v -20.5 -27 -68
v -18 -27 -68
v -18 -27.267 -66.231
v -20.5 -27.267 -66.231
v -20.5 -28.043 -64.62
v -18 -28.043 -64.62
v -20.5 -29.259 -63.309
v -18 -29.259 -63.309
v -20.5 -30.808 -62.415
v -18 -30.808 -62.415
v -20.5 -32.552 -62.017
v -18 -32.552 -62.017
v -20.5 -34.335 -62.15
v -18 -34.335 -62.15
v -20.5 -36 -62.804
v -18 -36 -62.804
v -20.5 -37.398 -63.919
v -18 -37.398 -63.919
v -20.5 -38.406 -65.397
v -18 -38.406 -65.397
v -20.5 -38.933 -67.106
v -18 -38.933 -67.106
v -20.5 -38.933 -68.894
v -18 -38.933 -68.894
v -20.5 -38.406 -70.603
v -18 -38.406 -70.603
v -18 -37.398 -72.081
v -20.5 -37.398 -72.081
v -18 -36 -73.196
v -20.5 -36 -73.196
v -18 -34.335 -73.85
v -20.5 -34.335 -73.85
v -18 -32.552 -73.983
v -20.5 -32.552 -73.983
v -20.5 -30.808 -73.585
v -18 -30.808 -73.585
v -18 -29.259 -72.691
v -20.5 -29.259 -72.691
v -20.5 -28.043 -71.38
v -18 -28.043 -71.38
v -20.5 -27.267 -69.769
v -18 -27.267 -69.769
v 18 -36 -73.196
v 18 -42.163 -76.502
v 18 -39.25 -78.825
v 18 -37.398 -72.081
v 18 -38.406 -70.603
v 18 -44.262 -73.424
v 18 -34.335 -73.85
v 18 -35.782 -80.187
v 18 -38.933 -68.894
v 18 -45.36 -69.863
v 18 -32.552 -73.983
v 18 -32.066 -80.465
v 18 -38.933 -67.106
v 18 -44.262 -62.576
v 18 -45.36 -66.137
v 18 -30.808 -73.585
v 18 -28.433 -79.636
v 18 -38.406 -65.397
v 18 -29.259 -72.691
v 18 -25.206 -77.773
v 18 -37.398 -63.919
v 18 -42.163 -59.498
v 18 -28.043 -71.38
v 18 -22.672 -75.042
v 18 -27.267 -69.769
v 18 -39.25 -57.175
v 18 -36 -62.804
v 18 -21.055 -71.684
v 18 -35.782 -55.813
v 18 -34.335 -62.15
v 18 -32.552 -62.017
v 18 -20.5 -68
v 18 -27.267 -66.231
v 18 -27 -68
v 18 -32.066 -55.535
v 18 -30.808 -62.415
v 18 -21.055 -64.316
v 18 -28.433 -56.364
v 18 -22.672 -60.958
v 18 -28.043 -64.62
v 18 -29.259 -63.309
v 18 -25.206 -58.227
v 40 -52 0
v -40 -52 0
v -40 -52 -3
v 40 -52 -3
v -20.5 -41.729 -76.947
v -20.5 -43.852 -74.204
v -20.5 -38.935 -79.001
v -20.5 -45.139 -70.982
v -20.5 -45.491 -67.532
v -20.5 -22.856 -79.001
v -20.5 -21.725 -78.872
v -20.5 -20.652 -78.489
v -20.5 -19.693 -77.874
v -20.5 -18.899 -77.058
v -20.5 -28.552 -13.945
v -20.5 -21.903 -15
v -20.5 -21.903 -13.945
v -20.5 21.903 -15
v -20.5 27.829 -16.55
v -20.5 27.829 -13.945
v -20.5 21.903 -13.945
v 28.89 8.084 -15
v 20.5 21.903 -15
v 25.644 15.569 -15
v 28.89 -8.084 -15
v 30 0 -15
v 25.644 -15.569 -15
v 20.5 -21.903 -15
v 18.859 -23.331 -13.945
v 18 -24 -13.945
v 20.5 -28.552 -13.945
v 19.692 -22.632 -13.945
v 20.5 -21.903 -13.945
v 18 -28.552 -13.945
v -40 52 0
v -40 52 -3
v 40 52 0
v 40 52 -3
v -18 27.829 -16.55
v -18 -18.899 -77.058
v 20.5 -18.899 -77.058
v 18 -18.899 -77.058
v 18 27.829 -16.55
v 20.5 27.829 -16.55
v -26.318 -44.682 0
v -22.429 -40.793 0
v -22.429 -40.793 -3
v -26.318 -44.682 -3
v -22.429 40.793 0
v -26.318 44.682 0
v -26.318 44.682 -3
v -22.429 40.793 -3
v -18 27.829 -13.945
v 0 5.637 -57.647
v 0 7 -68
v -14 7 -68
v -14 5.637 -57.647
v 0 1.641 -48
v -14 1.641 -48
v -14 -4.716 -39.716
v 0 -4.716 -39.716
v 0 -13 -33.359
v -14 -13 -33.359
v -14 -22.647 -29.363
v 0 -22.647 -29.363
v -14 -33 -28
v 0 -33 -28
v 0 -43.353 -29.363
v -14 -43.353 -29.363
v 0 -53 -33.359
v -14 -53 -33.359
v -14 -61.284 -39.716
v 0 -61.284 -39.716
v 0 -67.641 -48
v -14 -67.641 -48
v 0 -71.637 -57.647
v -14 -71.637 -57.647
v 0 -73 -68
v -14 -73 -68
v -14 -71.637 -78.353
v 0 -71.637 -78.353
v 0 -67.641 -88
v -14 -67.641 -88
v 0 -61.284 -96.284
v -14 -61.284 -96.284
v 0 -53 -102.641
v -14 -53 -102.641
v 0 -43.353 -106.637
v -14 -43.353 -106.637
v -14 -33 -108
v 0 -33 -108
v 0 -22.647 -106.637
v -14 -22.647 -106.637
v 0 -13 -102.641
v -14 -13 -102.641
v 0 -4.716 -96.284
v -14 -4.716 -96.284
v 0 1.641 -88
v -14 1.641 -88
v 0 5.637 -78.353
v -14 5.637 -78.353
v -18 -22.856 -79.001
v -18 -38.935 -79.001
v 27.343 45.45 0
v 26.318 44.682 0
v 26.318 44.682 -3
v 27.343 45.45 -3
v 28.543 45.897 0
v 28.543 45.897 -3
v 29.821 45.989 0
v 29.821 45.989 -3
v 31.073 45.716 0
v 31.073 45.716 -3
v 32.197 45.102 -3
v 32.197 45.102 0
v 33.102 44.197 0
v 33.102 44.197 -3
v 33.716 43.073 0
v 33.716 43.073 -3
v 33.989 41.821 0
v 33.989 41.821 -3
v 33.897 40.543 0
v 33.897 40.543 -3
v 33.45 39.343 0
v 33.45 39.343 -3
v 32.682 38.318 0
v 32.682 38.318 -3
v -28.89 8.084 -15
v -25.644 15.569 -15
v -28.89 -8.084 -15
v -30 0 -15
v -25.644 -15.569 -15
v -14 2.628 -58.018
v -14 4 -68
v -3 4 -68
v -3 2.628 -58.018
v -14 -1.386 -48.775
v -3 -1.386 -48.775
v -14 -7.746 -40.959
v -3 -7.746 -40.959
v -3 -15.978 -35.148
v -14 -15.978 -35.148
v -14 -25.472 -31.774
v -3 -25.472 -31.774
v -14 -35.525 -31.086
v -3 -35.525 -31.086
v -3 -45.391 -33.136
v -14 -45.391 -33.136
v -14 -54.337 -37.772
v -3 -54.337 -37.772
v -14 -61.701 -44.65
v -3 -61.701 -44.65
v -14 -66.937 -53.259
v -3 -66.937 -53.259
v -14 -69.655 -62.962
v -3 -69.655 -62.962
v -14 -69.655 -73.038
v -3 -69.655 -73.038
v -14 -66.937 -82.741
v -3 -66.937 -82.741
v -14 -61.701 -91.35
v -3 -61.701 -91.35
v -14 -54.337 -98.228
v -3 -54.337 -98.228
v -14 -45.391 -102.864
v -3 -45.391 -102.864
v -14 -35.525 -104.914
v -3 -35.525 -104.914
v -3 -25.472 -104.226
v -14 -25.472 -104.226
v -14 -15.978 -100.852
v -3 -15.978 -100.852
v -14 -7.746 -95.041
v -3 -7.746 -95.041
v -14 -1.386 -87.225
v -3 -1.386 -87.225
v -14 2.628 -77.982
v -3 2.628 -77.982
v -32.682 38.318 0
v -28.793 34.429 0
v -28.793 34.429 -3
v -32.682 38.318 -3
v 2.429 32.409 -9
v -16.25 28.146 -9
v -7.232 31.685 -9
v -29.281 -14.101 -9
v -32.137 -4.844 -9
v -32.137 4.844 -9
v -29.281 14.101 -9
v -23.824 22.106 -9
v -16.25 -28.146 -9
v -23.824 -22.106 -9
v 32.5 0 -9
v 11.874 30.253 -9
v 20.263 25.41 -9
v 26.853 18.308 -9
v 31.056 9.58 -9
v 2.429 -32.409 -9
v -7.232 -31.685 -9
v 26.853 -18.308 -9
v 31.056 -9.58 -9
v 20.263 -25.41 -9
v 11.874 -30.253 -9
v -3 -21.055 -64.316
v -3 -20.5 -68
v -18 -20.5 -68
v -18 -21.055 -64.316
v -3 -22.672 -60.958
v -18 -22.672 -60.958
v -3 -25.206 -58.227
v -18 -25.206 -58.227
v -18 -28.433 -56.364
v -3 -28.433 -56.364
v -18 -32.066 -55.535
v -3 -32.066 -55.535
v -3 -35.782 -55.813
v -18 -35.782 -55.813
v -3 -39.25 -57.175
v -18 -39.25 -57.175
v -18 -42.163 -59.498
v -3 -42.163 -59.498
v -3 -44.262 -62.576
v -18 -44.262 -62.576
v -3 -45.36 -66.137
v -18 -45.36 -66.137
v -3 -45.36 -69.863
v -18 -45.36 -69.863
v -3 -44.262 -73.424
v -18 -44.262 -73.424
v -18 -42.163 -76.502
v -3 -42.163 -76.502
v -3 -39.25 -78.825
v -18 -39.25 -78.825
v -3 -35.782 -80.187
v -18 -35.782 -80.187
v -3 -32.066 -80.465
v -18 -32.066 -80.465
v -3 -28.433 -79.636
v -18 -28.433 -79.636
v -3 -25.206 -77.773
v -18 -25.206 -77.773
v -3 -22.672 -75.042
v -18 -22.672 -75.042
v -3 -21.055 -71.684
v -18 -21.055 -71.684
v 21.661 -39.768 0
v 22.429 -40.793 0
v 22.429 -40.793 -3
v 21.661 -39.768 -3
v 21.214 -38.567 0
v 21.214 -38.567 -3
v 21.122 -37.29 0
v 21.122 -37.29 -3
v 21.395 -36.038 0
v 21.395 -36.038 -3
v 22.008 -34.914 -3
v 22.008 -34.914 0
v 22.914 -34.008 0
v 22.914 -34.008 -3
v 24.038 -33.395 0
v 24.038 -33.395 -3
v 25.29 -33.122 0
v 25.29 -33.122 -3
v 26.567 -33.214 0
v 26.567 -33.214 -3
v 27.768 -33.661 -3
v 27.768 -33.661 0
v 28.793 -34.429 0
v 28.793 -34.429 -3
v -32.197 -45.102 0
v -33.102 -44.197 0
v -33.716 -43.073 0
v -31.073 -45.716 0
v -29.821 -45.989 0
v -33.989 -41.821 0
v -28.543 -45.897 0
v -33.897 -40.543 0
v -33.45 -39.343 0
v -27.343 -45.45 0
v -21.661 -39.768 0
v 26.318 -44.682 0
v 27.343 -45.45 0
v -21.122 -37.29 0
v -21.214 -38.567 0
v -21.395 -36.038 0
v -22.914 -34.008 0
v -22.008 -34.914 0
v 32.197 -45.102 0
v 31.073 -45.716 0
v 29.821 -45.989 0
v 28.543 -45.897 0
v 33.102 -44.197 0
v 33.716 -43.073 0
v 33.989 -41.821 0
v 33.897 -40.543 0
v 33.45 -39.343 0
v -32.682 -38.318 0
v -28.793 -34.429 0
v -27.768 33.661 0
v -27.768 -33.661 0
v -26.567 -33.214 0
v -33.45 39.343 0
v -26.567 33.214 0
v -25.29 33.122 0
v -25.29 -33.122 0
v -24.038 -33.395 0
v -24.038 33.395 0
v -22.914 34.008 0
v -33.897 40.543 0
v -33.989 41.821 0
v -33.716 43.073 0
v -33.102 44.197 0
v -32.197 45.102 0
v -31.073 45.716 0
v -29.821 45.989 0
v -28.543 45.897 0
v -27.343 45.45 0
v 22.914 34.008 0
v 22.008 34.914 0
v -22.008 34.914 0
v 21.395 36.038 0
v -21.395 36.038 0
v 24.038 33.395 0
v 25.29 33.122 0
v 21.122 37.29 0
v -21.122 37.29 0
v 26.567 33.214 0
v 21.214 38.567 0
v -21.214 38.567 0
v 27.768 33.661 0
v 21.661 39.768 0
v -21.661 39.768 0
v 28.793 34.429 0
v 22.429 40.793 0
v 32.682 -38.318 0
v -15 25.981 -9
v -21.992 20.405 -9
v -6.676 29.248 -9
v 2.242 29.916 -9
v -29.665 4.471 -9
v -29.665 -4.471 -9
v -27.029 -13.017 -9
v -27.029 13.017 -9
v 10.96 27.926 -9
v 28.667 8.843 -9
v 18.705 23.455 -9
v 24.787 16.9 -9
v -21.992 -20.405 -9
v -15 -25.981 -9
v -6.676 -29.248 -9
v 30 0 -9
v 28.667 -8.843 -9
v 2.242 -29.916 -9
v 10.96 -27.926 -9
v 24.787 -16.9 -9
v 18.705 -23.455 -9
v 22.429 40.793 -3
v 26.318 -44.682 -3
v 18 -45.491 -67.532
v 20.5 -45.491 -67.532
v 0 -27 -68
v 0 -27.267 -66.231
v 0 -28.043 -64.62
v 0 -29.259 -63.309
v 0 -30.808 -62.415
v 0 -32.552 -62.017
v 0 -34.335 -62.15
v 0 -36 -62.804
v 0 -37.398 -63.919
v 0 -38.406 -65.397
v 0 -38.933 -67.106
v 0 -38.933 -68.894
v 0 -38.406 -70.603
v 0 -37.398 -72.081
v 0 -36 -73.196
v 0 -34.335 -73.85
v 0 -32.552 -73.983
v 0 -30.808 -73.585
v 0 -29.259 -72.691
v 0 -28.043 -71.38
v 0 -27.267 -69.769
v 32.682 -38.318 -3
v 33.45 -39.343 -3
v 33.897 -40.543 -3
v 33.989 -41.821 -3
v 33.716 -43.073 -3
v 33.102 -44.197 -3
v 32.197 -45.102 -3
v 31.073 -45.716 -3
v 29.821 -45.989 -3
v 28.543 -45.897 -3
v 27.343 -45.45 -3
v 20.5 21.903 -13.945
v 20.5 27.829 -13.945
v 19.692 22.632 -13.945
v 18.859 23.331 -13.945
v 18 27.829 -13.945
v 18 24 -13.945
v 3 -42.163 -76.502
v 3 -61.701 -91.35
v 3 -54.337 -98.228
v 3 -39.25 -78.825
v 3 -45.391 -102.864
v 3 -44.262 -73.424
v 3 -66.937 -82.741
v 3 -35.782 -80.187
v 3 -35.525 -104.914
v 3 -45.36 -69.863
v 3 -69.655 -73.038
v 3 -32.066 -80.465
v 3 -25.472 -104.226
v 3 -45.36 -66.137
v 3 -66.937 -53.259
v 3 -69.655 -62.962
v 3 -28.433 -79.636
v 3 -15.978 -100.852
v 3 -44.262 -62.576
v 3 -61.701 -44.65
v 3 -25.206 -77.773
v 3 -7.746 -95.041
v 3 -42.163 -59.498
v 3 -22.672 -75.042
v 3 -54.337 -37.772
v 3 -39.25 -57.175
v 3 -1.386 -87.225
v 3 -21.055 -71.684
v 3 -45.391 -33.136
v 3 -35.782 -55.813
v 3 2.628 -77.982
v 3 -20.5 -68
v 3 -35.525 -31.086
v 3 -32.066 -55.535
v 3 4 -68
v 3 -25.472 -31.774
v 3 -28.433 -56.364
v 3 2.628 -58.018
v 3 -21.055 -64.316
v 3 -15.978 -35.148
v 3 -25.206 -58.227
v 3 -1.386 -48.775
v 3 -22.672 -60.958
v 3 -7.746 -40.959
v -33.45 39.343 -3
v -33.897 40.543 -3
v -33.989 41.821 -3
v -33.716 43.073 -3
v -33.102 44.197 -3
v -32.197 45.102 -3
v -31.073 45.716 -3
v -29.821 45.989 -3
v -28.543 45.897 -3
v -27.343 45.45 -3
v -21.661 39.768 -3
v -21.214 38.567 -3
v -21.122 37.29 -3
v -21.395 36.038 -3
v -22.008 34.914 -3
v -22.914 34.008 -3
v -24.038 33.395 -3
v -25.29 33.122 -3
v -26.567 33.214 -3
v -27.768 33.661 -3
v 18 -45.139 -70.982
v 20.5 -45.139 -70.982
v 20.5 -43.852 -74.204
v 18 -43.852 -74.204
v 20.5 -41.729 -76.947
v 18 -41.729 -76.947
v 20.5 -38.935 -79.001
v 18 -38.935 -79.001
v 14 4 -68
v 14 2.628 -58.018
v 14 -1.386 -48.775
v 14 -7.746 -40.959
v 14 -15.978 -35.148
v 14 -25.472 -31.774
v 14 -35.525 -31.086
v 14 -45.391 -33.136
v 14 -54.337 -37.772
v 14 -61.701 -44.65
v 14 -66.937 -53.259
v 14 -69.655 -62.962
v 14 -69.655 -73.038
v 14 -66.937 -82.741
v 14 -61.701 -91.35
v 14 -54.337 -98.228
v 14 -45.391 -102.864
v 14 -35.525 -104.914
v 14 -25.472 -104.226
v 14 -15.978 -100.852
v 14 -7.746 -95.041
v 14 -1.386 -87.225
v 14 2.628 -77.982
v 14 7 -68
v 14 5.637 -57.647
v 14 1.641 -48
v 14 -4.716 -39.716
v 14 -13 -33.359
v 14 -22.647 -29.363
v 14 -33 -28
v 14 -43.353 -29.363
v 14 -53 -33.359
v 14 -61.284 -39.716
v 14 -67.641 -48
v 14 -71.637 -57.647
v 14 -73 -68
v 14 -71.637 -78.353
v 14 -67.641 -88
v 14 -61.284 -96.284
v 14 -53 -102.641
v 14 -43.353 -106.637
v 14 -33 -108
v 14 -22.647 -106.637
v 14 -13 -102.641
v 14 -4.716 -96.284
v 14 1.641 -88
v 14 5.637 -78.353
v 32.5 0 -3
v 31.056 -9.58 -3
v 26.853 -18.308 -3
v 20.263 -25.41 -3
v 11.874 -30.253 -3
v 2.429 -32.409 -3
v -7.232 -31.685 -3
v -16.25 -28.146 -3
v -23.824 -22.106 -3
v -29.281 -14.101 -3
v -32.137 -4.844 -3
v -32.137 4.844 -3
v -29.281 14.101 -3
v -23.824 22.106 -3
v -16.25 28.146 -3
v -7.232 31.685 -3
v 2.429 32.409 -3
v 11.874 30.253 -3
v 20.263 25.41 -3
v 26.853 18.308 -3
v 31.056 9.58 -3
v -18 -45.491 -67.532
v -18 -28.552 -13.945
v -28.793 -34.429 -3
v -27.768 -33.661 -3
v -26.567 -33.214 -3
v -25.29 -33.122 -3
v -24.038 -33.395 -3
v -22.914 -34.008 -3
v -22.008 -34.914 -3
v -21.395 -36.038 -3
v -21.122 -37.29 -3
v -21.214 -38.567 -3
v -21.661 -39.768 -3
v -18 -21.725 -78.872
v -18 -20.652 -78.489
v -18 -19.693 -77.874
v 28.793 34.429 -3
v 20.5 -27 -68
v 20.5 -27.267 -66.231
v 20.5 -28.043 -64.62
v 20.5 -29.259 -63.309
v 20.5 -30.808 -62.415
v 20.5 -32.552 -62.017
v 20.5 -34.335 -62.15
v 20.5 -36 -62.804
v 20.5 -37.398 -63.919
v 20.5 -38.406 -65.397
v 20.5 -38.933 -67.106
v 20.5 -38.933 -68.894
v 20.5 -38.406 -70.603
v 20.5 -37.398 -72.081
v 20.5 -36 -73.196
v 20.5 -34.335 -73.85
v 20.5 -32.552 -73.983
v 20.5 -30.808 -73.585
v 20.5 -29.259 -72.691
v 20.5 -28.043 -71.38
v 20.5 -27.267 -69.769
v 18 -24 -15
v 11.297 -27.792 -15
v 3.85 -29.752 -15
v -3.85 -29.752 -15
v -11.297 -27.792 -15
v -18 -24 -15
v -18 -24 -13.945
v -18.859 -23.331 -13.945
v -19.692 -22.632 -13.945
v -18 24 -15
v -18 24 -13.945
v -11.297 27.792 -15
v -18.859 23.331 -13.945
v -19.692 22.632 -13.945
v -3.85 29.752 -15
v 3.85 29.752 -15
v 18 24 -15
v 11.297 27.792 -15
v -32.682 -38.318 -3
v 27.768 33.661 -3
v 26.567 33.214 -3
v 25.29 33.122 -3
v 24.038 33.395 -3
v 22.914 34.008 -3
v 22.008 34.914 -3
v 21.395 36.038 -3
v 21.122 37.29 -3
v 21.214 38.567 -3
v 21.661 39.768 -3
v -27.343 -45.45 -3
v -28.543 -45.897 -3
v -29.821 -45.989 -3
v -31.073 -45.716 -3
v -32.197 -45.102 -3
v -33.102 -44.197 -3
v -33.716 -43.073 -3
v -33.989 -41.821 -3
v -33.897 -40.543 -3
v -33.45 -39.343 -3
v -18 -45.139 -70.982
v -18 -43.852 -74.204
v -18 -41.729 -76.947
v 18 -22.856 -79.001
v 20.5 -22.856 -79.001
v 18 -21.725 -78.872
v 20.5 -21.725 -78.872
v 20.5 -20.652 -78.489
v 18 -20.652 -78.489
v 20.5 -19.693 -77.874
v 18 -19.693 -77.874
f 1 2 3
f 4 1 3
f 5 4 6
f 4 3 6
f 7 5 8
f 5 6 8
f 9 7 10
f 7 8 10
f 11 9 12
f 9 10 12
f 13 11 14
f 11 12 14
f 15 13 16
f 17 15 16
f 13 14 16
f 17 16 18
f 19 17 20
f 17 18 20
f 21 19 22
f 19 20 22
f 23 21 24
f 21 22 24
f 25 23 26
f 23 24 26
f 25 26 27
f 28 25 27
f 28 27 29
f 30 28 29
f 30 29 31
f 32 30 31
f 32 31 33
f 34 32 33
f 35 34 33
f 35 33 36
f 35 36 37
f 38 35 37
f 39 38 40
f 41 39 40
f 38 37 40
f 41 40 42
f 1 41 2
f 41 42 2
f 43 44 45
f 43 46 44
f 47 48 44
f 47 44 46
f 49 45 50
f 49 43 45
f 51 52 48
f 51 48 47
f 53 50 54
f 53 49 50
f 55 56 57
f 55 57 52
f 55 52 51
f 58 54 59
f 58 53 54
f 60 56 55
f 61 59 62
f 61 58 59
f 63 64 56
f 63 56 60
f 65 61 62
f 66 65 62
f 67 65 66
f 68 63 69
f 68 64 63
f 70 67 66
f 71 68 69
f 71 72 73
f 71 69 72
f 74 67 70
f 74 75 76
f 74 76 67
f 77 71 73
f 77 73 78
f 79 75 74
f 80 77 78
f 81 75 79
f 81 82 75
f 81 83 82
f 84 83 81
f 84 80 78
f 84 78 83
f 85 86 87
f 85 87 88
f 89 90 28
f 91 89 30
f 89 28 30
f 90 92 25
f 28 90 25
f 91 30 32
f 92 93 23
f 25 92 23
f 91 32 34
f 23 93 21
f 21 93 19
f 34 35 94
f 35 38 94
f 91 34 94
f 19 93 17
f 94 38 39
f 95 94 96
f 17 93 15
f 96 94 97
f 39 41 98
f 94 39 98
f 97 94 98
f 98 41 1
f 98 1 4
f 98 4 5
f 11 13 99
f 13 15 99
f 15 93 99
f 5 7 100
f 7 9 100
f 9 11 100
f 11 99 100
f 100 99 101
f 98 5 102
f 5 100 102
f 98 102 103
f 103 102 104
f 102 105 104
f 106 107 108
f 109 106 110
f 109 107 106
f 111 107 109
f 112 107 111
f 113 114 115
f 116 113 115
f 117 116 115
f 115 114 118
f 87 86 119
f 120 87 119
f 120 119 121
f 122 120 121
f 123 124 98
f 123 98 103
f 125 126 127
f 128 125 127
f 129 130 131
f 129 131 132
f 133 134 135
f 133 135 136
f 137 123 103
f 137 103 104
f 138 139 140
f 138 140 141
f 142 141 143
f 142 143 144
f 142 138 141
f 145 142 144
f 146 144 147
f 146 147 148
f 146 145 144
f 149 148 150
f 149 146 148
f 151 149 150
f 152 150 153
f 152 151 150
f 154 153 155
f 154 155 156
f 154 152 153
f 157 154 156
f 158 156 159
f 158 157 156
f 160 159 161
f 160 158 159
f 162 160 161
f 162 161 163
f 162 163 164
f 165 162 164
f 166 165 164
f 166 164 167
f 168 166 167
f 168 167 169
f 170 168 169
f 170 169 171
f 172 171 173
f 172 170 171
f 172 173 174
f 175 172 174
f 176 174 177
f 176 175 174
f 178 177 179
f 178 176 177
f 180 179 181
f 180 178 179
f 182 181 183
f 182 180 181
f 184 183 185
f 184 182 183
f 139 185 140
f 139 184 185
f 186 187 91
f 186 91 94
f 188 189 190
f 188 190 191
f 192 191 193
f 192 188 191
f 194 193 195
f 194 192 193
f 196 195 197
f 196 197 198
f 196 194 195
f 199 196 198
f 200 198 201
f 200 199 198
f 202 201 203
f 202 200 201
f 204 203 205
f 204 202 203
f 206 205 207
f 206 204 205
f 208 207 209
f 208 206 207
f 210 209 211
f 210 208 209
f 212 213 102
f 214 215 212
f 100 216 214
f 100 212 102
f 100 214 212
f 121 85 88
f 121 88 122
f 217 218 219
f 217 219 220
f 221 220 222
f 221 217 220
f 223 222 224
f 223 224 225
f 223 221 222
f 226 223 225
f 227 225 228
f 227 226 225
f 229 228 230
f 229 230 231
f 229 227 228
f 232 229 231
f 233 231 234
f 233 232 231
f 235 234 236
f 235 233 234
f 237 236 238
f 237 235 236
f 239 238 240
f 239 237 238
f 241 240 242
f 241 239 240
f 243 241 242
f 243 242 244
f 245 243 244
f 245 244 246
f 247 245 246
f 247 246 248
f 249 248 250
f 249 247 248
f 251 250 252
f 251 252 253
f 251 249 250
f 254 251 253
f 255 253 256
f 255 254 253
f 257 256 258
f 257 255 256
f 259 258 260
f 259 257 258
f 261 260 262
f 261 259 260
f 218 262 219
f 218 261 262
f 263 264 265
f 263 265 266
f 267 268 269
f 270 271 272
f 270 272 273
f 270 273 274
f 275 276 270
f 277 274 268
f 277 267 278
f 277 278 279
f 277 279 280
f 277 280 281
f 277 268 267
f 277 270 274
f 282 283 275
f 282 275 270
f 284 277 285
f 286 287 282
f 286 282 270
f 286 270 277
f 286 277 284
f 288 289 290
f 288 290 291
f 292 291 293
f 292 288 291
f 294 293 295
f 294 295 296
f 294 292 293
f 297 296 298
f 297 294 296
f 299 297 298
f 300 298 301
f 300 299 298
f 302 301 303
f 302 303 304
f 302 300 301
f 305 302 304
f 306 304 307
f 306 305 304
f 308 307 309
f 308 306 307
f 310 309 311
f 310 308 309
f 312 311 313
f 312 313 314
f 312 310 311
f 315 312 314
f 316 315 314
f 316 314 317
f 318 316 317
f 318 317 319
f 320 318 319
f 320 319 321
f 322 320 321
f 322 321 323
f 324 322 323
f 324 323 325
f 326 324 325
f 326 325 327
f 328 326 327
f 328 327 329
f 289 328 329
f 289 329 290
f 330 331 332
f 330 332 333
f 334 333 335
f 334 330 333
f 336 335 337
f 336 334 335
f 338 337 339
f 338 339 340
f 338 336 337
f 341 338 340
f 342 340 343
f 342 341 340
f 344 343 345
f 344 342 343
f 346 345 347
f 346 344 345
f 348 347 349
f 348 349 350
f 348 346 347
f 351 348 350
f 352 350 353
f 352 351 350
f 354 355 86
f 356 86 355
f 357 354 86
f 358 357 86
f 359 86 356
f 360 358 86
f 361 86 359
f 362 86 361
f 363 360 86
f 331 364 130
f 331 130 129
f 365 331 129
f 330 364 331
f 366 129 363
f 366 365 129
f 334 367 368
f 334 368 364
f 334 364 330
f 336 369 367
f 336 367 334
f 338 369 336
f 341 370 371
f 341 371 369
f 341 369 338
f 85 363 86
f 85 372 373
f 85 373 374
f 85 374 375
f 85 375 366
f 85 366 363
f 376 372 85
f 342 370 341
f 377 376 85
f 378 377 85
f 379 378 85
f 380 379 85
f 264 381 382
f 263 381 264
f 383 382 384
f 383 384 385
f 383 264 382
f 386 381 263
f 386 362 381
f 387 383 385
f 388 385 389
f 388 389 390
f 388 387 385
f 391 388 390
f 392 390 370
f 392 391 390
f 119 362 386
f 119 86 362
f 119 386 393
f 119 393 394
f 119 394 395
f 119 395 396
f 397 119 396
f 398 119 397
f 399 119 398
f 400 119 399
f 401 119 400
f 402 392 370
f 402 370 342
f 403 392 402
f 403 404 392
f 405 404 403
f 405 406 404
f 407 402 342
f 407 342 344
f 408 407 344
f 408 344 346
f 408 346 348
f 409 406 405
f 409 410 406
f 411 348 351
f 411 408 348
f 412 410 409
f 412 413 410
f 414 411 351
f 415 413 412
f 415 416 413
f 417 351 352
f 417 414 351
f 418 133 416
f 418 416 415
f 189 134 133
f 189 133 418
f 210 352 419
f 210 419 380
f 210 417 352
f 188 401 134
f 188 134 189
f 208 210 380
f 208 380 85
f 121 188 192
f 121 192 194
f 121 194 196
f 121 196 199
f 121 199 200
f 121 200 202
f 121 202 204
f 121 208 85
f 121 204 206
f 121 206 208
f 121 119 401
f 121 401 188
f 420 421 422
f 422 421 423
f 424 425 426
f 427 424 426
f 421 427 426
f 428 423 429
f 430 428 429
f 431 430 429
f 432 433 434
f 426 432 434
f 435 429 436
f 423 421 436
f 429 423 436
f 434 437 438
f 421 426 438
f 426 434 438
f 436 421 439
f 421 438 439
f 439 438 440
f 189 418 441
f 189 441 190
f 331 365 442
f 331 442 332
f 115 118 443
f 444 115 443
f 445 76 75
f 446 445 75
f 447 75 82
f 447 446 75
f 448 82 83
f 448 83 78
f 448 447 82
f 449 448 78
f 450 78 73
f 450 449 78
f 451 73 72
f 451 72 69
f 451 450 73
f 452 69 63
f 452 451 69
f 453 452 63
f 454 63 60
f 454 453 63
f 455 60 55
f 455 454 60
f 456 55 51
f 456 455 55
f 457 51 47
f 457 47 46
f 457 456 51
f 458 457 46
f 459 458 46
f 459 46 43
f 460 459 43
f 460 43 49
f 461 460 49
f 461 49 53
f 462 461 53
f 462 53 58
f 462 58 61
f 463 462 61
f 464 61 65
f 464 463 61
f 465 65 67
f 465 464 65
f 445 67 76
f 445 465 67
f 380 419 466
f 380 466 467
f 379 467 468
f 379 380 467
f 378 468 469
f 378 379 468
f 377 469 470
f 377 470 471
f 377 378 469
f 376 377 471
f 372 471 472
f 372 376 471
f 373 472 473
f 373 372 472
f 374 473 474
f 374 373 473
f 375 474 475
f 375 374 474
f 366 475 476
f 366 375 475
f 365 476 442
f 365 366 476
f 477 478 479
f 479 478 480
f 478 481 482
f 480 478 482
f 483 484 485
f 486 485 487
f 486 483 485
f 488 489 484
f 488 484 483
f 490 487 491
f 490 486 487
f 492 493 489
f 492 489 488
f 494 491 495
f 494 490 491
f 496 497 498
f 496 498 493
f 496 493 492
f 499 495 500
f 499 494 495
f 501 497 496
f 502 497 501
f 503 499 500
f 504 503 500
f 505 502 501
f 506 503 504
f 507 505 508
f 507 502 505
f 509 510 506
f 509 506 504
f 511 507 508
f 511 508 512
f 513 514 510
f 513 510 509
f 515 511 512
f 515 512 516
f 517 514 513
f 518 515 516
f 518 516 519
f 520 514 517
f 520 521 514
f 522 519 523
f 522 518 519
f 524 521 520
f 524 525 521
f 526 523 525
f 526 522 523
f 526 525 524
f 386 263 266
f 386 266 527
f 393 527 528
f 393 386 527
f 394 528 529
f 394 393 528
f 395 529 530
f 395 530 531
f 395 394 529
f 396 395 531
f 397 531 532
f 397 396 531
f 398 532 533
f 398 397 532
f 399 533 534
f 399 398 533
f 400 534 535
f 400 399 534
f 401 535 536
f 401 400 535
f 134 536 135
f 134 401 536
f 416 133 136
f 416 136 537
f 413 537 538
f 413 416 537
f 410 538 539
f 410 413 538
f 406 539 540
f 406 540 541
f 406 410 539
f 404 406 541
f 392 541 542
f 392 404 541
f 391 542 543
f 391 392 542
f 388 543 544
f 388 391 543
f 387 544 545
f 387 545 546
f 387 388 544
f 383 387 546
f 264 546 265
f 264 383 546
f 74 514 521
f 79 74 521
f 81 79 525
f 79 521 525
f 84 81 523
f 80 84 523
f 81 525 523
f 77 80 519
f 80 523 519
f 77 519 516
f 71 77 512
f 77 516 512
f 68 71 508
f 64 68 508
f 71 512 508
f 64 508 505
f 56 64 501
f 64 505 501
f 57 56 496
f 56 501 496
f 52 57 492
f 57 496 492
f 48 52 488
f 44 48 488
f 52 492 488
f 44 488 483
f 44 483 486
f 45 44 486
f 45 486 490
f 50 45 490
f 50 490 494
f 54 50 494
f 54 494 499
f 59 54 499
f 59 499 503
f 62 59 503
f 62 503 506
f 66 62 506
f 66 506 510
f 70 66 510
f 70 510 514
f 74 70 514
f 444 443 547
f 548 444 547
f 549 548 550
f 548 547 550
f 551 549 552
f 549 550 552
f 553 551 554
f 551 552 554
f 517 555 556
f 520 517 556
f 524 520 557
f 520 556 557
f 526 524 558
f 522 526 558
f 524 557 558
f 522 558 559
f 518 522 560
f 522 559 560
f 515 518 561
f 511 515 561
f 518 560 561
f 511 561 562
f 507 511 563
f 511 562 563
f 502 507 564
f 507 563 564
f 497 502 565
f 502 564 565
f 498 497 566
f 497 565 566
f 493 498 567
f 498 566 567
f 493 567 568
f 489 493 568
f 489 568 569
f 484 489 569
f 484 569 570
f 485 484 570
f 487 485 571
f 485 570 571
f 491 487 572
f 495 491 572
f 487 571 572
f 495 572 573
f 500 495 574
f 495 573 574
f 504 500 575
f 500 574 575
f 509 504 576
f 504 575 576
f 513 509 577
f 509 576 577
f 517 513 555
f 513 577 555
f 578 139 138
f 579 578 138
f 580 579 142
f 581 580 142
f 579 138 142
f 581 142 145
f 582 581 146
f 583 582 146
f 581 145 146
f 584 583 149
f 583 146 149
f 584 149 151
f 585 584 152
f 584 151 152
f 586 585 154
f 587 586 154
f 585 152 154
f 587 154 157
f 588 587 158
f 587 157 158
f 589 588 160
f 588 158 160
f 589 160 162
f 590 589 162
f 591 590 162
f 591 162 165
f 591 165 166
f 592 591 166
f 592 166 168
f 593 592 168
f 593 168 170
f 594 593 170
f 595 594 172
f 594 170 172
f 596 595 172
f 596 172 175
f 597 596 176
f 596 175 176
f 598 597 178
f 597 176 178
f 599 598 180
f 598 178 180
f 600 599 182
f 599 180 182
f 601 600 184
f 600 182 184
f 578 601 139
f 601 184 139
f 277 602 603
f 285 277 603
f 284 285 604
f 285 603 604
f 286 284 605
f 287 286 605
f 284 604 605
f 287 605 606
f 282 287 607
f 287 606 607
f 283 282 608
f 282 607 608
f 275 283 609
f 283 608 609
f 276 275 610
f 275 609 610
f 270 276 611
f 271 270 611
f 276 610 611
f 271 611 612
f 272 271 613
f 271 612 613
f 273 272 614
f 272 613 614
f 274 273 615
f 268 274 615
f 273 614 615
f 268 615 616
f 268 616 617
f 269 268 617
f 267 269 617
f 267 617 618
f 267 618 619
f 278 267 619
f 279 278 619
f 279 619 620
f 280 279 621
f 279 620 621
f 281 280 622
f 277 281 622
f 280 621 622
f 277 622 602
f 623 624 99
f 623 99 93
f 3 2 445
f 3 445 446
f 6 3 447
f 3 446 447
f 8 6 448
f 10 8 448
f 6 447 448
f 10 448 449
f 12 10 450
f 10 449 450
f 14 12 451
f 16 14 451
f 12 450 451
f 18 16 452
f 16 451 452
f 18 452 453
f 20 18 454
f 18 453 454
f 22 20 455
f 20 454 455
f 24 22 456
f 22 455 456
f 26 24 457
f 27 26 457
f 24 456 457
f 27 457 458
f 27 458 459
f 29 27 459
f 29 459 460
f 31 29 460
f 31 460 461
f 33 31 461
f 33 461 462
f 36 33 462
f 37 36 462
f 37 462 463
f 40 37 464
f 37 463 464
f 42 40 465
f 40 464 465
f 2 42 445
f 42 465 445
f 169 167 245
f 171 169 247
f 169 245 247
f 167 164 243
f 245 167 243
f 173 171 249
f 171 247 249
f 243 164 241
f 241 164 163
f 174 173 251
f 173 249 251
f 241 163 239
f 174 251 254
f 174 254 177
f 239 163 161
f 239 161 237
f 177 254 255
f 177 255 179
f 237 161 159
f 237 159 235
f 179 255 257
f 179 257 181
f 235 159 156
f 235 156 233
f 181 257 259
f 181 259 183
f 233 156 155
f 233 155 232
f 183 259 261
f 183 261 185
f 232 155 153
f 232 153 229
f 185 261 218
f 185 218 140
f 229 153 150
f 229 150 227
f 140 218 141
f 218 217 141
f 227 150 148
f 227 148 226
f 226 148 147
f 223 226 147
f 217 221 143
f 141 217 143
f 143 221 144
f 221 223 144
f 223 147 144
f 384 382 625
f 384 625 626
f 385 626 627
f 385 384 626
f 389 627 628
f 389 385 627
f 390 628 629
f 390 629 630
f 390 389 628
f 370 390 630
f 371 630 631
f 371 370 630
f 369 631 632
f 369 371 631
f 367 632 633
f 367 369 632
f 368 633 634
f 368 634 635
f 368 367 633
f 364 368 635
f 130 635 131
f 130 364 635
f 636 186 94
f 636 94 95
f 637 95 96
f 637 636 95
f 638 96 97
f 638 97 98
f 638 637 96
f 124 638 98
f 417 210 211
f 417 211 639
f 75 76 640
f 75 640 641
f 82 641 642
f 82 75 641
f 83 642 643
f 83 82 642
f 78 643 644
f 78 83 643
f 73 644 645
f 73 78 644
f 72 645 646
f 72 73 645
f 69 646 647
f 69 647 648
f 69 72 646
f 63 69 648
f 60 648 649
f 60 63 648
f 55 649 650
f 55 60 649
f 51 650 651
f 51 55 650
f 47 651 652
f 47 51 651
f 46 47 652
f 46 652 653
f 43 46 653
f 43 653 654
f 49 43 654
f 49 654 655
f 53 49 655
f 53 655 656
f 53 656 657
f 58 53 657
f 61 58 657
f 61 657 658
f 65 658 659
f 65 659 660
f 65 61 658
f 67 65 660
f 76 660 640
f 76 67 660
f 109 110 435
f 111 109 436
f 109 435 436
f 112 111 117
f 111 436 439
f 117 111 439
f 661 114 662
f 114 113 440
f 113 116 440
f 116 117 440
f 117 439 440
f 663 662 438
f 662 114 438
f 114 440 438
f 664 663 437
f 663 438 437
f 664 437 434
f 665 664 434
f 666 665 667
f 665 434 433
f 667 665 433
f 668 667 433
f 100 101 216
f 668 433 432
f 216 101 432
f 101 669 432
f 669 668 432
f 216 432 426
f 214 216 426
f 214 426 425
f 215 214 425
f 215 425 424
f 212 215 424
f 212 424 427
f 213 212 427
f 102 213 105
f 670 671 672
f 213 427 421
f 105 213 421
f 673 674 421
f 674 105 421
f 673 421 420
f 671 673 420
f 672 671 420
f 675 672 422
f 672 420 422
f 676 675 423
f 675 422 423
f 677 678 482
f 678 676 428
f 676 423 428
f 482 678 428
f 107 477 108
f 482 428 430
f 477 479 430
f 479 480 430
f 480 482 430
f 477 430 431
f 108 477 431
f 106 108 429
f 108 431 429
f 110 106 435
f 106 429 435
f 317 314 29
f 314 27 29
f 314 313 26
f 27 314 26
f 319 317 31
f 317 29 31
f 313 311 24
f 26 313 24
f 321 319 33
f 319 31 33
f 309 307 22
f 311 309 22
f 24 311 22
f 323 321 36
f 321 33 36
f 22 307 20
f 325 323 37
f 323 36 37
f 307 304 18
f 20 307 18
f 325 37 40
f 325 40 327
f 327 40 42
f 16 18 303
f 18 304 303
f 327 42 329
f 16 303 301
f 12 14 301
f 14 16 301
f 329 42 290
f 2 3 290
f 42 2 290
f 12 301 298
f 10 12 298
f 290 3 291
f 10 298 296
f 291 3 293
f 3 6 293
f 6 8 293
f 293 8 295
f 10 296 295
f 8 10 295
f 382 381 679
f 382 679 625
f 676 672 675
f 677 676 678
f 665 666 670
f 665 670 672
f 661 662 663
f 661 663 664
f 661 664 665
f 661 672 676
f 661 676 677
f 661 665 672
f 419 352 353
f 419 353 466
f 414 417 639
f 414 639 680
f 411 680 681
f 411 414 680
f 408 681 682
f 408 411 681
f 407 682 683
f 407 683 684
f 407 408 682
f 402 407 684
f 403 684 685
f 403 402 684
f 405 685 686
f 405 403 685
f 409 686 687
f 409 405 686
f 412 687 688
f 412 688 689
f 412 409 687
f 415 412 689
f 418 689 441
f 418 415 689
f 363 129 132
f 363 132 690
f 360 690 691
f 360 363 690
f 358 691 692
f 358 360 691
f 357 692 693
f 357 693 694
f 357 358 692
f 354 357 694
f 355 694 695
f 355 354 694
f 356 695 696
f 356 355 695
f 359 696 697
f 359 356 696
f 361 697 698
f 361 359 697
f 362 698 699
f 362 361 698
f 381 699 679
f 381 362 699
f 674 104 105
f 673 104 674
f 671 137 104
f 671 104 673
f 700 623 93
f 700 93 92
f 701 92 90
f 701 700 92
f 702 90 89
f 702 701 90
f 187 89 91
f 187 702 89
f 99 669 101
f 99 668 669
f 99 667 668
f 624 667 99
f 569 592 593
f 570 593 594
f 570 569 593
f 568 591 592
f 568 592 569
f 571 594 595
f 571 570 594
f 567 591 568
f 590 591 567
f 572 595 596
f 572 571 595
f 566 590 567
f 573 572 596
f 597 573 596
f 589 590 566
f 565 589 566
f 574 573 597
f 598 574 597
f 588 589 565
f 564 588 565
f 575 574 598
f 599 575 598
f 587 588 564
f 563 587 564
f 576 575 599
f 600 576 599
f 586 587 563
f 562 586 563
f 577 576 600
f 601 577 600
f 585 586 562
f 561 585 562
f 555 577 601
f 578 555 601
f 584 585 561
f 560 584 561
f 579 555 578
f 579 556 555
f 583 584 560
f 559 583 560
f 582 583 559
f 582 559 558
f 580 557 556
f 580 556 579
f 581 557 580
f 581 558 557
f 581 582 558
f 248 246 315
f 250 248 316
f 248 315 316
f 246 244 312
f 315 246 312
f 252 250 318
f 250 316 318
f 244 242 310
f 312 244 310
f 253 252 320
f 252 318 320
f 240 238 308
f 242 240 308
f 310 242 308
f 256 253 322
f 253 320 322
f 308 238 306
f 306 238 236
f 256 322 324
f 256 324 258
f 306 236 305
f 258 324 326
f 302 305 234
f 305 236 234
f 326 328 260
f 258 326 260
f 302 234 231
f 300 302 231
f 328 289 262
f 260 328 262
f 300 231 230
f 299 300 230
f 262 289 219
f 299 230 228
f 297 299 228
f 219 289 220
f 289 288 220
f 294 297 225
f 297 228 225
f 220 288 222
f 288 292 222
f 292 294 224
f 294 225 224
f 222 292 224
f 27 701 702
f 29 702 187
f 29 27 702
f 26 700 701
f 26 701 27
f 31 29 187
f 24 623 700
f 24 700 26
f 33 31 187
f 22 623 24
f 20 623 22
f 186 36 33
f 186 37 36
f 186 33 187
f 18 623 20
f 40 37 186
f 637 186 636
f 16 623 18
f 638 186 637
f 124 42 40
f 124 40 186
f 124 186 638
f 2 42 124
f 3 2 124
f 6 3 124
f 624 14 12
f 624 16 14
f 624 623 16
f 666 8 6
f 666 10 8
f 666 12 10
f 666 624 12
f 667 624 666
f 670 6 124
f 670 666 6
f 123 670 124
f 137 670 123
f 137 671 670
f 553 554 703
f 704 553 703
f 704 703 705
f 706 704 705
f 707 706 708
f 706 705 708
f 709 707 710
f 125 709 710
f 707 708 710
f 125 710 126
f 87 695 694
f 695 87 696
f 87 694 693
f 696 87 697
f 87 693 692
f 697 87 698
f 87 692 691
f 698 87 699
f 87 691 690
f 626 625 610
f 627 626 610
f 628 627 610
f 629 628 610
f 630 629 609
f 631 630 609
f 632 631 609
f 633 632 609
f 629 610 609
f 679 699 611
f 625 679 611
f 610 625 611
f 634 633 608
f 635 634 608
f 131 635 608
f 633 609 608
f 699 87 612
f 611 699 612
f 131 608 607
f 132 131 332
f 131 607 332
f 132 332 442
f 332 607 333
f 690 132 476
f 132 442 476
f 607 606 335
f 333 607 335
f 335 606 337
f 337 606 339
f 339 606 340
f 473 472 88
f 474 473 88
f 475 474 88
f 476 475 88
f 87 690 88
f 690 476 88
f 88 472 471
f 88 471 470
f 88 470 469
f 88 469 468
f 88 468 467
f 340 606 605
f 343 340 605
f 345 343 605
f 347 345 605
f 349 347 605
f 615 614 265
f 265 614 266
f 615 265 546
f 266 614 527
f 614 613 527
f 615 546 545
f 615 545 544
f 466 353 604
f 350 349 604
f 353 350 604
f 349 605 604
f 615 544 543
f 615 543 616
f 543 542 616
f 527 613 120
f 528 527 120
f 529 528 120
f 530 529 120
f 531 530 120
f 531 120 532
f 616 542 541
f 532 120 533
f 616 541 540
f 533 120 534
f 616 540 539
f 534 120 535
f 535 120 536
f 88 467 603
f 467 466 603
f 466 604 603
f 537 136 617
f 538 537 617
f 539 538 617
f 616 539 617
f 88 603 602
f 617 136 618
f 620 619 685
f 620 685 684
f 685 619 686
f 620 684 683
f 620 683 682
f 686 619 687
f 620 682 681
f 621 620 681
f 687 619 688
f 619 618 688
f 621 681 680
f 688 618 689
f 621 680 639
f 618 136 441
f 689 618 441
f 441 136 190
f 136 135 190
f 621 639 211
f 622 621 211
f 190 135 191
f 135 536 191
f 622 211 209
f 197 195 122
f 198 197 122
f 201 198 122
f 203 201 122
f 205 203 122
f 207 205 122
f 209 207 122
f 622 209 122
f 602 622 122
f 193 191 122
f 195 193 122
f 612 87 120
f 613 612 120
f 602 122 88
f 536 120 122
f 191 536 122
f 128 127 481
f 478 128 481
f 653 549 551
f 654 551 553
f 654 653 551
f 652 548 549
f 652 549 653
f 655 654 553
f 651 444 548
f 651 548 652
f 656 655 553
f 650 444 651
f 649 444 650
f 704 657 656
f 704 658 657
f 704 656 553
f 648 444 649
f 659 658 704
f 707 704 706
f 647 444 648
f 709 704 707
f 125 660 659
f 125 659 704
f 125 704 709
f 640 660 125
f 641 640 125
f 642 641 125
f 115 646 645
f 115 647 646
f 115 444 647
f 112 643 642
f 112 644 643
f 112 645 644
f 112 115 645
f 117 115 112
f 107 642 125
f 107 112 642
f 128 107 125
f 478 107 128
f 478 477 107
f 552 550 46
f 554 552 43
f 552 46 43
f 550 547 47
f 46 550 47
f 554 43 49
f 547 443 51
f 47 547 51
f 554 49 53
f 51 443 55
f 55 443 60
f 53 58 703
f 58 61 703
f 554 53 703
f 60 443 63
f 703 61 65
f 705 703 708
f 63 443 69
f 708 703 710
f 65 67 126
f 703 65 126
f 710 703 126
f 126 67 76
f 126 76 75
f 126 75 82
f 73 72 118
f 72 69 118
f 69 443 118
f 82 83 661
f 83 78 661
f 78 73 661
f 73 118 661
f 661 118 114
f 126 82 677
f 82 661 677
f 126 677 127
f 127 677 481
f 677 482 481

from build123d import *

# Parameters (mm, degrees)
F1_W      = 80
F1_H      = 104
F2_DEPTH  = 3
F3_R      = 40
F3_R_2    = 12.5
F4_DEPTH  = 14
F5_R      = 37
F5_R_2    = 12.5
F6_DEPTH  = 11
F3_R_3    = 6
F7_DEPTH  = 18
F9_R      = 32.5
F10_DEPTH = 6
F11_R     = 6
F12_DEPTH = 2.5
F14_R     = 30
F15_DEPTH = 6


with BuildPart() as f2:
    # F1 (on Top) → F2 (new body)
    with BuildSketch(Plane.XY):
        Rectangle(F1_W, F1_H)
        with BuildLine():
            Line((-32.6819805153, -38.3180194847), (-28.7928932188, -34.4289321881))
            ThreePointArc((-28.7928932188, -34.4289321881), (-22.4289321881, -34.4289321881), (-22.4289321881, -40.7928932188))
            Line((-22.4289321881, -40.7928932188), (-26.3180194847, -44.6819805153))
            ThreePointArc((-26.3180194847, -44.6819805153), (-32.6819805153, -44.6819805153), (-32.6819805153, -38.3180194847))
        make_face(mode=Mode.SUBTRACT)
        with BuildLine():
            ThreePointArc((32.6819805153, -38.3180194847), (32.6819805153, -44.6819805153), (26.3180194847, -44.6819805153))
            Line((26.3180194847, -44.6819805153), (22.4289321881, -40.7928932188))
            ThreePointArc((22.4289321881, -40.7928932188), (22.4289321881, -34.4289321881), (28.7928932188, -34.4289321881))
            Line((28.7928932188, -34.4289321881), (32.6819805153, -38.3180194847))
        make_face(mode=Mode.SUBTRACT)
        with BuildLine():
            ThreePointArc((-32.6819805153, 38.3180194847), (-32.6819805153, 44.6819805153), (-26.3180194847, 44.6819805153))
            Line((-26.3180194847, 44.6819805153), (-22.4289321881, 40.7928932188))
            ThreePointArc((-22.4289321881, 40.7928932188), (-22.4289321881, 34.4289321881), (-28.7928932188, 34.4289321881))
            Line((-28.7928932188, 34.4289321881), (-32.6819805153, 38.3180194847))
        make_face(mode=Mode.SUBTRACT)
        with BuildLine():
            Line((32.6819805153, 38.3180194847), (28.7928932188, 34.4289321881))
            ThreePointArc((28.7928932188, 34.4289321881), (22.4289321881, 34.4289321881), (22.4289321881, 40.7928932188))
            Line((22.4289321881, 40.7928932188), (26.3180194847, 44.6819805153))
            ThreePointArc((26.3180194847, 44.6819805153), (32.6819805153, 44.6819805153), (32.6819805153, 38.3180194847))
        make_face(mode=Mode.SUBTRACT)
    extrude(amount=-F2_DEPTH)

    # F9 (on face) → F10 (join)
    with BuildSketch(Plane(origin=(0, 0, -3), x_dir=(1, 0, 0), z_dir=(0, 0, -1))):
        Circle(F9_R)
    extrude(amount=F10_DEPTH)


with BuildPart() as f4:
    # F3 (on Right) → F4 (new body)
    with BuildSketch(Plane.YZ):
        with Locations((-33, -68)):
            Circle(F3_R)
        with Locations((-33, -68)):
            Circle(F3_R_2, mode=Mode.SUBTRACT)
    extrude(amount=F4_DEPTH)

    # F5 (on face) → F6 (cut)
    with BuildSketch(Plane.YZ.offset(14)):
        with Locations((-33, -68)):
            Circle(F5_R)
        with Locations((-33, -68)):
            Circle(F5_R_2, mode=Mode.SUBTRACT)
    extrude(amount=-F6_DEPTH, mode=Mode.SUBTRACT)

    # F3 (on Right) → F7 (join)
    with BuildSketch(Plane.YZ):
        with Locations((-33, -68)):
            Circle(F3_R_2)
        with Locations((-33, -68)):
            Circle(F3_R_3, mode=Mode.SUBTRACT)
    extrude(amount=F7_DEPTH)

    # F8: F4 across plane


with BuildPart() as f4_1:
    add(f4.part)
    add(f4.part.mirror(Plane.YZ))


with BuildPart() as f12:
    # F11 (on face) → F12 (new body)
    with BuildSketch(Plane.YZ.offset(18)):
        with BuildLine():
            ThreePointArc((-20.5, -68), (-22.266129945, -74.4057812672), (-27.0654453829, -79.0014117956))
            Line((-27.0654453829, -79.0014117956), (-22.8563387324, -79.0014117956))
            ThreePointArc((-22.8563387324, -79.0014117956), (-20.651853104, -78.4892000163), (-18.899032878, -77.0575090412))
            Line((-18.899032878, -77.0575090412), (27.8291888535, -16.5496617556))
            Line((27.8291888535, -16.5496617556), (27.8291888535, -13.9453392476))
            Line((27.8291888535, -13.9453392476), (-28.5524237418, -13.9453392476))
            Line((-28.5524237418, -13.9453392476), (-43.4908901592, -61.2035874413))
            ThreePointArc((-43.4908901592, -61.2035874413), (-29.4564232046, -56.0127958433), (-20.5, -68))
        make_face()
        with BuildLine():
            ThreePointArc((-45.4912247538, -67.5317007898), (-43.8519999998, -74.2035551101), (-38.9345546171, -79.0014117956))
            Line((-38.9345546171, -79.0014117956), (-27.0654453829, -79.0014117956))
            ThreePointArc((-27.0654453829, -79.0014117956), (-22.266129945, -74.4057812672), (-20.5, -68))
            ThreePointArc((-20.5, -68), (-29.4564232046, -56.0127958433), (-43.4908901592, -61.2035874413))
            Line((-43.4908901592, -61.2035874413), (-45.4912247538, -67.5317007898))
        make_face()
        with Locations((-33, -68)):
            Circle(F11_R, mode=Mode.SUBTRACT)
    extrude(amount=F12_DEPTH)


with BuildPart() as f13_1:
    # F13: instance of F12
    add(f12.part.mirror(Plane.YZ))


with BuildPart() as f12_1:
    add(f12.part)

    add(f13_1.part)  # F15 merges F13_1
    # F14 (on face) → F15 (join)
    with BuildSketch(Plane(origin=(0, 0, -9), x_dir=(1, 0, 0), z_dir=(0, 0, -1))):
        Circle(F14_R)
    extrude(amount=F15_DEPTH)


solid = Compound([f2.part, f4_1.part, f12_1.part])
